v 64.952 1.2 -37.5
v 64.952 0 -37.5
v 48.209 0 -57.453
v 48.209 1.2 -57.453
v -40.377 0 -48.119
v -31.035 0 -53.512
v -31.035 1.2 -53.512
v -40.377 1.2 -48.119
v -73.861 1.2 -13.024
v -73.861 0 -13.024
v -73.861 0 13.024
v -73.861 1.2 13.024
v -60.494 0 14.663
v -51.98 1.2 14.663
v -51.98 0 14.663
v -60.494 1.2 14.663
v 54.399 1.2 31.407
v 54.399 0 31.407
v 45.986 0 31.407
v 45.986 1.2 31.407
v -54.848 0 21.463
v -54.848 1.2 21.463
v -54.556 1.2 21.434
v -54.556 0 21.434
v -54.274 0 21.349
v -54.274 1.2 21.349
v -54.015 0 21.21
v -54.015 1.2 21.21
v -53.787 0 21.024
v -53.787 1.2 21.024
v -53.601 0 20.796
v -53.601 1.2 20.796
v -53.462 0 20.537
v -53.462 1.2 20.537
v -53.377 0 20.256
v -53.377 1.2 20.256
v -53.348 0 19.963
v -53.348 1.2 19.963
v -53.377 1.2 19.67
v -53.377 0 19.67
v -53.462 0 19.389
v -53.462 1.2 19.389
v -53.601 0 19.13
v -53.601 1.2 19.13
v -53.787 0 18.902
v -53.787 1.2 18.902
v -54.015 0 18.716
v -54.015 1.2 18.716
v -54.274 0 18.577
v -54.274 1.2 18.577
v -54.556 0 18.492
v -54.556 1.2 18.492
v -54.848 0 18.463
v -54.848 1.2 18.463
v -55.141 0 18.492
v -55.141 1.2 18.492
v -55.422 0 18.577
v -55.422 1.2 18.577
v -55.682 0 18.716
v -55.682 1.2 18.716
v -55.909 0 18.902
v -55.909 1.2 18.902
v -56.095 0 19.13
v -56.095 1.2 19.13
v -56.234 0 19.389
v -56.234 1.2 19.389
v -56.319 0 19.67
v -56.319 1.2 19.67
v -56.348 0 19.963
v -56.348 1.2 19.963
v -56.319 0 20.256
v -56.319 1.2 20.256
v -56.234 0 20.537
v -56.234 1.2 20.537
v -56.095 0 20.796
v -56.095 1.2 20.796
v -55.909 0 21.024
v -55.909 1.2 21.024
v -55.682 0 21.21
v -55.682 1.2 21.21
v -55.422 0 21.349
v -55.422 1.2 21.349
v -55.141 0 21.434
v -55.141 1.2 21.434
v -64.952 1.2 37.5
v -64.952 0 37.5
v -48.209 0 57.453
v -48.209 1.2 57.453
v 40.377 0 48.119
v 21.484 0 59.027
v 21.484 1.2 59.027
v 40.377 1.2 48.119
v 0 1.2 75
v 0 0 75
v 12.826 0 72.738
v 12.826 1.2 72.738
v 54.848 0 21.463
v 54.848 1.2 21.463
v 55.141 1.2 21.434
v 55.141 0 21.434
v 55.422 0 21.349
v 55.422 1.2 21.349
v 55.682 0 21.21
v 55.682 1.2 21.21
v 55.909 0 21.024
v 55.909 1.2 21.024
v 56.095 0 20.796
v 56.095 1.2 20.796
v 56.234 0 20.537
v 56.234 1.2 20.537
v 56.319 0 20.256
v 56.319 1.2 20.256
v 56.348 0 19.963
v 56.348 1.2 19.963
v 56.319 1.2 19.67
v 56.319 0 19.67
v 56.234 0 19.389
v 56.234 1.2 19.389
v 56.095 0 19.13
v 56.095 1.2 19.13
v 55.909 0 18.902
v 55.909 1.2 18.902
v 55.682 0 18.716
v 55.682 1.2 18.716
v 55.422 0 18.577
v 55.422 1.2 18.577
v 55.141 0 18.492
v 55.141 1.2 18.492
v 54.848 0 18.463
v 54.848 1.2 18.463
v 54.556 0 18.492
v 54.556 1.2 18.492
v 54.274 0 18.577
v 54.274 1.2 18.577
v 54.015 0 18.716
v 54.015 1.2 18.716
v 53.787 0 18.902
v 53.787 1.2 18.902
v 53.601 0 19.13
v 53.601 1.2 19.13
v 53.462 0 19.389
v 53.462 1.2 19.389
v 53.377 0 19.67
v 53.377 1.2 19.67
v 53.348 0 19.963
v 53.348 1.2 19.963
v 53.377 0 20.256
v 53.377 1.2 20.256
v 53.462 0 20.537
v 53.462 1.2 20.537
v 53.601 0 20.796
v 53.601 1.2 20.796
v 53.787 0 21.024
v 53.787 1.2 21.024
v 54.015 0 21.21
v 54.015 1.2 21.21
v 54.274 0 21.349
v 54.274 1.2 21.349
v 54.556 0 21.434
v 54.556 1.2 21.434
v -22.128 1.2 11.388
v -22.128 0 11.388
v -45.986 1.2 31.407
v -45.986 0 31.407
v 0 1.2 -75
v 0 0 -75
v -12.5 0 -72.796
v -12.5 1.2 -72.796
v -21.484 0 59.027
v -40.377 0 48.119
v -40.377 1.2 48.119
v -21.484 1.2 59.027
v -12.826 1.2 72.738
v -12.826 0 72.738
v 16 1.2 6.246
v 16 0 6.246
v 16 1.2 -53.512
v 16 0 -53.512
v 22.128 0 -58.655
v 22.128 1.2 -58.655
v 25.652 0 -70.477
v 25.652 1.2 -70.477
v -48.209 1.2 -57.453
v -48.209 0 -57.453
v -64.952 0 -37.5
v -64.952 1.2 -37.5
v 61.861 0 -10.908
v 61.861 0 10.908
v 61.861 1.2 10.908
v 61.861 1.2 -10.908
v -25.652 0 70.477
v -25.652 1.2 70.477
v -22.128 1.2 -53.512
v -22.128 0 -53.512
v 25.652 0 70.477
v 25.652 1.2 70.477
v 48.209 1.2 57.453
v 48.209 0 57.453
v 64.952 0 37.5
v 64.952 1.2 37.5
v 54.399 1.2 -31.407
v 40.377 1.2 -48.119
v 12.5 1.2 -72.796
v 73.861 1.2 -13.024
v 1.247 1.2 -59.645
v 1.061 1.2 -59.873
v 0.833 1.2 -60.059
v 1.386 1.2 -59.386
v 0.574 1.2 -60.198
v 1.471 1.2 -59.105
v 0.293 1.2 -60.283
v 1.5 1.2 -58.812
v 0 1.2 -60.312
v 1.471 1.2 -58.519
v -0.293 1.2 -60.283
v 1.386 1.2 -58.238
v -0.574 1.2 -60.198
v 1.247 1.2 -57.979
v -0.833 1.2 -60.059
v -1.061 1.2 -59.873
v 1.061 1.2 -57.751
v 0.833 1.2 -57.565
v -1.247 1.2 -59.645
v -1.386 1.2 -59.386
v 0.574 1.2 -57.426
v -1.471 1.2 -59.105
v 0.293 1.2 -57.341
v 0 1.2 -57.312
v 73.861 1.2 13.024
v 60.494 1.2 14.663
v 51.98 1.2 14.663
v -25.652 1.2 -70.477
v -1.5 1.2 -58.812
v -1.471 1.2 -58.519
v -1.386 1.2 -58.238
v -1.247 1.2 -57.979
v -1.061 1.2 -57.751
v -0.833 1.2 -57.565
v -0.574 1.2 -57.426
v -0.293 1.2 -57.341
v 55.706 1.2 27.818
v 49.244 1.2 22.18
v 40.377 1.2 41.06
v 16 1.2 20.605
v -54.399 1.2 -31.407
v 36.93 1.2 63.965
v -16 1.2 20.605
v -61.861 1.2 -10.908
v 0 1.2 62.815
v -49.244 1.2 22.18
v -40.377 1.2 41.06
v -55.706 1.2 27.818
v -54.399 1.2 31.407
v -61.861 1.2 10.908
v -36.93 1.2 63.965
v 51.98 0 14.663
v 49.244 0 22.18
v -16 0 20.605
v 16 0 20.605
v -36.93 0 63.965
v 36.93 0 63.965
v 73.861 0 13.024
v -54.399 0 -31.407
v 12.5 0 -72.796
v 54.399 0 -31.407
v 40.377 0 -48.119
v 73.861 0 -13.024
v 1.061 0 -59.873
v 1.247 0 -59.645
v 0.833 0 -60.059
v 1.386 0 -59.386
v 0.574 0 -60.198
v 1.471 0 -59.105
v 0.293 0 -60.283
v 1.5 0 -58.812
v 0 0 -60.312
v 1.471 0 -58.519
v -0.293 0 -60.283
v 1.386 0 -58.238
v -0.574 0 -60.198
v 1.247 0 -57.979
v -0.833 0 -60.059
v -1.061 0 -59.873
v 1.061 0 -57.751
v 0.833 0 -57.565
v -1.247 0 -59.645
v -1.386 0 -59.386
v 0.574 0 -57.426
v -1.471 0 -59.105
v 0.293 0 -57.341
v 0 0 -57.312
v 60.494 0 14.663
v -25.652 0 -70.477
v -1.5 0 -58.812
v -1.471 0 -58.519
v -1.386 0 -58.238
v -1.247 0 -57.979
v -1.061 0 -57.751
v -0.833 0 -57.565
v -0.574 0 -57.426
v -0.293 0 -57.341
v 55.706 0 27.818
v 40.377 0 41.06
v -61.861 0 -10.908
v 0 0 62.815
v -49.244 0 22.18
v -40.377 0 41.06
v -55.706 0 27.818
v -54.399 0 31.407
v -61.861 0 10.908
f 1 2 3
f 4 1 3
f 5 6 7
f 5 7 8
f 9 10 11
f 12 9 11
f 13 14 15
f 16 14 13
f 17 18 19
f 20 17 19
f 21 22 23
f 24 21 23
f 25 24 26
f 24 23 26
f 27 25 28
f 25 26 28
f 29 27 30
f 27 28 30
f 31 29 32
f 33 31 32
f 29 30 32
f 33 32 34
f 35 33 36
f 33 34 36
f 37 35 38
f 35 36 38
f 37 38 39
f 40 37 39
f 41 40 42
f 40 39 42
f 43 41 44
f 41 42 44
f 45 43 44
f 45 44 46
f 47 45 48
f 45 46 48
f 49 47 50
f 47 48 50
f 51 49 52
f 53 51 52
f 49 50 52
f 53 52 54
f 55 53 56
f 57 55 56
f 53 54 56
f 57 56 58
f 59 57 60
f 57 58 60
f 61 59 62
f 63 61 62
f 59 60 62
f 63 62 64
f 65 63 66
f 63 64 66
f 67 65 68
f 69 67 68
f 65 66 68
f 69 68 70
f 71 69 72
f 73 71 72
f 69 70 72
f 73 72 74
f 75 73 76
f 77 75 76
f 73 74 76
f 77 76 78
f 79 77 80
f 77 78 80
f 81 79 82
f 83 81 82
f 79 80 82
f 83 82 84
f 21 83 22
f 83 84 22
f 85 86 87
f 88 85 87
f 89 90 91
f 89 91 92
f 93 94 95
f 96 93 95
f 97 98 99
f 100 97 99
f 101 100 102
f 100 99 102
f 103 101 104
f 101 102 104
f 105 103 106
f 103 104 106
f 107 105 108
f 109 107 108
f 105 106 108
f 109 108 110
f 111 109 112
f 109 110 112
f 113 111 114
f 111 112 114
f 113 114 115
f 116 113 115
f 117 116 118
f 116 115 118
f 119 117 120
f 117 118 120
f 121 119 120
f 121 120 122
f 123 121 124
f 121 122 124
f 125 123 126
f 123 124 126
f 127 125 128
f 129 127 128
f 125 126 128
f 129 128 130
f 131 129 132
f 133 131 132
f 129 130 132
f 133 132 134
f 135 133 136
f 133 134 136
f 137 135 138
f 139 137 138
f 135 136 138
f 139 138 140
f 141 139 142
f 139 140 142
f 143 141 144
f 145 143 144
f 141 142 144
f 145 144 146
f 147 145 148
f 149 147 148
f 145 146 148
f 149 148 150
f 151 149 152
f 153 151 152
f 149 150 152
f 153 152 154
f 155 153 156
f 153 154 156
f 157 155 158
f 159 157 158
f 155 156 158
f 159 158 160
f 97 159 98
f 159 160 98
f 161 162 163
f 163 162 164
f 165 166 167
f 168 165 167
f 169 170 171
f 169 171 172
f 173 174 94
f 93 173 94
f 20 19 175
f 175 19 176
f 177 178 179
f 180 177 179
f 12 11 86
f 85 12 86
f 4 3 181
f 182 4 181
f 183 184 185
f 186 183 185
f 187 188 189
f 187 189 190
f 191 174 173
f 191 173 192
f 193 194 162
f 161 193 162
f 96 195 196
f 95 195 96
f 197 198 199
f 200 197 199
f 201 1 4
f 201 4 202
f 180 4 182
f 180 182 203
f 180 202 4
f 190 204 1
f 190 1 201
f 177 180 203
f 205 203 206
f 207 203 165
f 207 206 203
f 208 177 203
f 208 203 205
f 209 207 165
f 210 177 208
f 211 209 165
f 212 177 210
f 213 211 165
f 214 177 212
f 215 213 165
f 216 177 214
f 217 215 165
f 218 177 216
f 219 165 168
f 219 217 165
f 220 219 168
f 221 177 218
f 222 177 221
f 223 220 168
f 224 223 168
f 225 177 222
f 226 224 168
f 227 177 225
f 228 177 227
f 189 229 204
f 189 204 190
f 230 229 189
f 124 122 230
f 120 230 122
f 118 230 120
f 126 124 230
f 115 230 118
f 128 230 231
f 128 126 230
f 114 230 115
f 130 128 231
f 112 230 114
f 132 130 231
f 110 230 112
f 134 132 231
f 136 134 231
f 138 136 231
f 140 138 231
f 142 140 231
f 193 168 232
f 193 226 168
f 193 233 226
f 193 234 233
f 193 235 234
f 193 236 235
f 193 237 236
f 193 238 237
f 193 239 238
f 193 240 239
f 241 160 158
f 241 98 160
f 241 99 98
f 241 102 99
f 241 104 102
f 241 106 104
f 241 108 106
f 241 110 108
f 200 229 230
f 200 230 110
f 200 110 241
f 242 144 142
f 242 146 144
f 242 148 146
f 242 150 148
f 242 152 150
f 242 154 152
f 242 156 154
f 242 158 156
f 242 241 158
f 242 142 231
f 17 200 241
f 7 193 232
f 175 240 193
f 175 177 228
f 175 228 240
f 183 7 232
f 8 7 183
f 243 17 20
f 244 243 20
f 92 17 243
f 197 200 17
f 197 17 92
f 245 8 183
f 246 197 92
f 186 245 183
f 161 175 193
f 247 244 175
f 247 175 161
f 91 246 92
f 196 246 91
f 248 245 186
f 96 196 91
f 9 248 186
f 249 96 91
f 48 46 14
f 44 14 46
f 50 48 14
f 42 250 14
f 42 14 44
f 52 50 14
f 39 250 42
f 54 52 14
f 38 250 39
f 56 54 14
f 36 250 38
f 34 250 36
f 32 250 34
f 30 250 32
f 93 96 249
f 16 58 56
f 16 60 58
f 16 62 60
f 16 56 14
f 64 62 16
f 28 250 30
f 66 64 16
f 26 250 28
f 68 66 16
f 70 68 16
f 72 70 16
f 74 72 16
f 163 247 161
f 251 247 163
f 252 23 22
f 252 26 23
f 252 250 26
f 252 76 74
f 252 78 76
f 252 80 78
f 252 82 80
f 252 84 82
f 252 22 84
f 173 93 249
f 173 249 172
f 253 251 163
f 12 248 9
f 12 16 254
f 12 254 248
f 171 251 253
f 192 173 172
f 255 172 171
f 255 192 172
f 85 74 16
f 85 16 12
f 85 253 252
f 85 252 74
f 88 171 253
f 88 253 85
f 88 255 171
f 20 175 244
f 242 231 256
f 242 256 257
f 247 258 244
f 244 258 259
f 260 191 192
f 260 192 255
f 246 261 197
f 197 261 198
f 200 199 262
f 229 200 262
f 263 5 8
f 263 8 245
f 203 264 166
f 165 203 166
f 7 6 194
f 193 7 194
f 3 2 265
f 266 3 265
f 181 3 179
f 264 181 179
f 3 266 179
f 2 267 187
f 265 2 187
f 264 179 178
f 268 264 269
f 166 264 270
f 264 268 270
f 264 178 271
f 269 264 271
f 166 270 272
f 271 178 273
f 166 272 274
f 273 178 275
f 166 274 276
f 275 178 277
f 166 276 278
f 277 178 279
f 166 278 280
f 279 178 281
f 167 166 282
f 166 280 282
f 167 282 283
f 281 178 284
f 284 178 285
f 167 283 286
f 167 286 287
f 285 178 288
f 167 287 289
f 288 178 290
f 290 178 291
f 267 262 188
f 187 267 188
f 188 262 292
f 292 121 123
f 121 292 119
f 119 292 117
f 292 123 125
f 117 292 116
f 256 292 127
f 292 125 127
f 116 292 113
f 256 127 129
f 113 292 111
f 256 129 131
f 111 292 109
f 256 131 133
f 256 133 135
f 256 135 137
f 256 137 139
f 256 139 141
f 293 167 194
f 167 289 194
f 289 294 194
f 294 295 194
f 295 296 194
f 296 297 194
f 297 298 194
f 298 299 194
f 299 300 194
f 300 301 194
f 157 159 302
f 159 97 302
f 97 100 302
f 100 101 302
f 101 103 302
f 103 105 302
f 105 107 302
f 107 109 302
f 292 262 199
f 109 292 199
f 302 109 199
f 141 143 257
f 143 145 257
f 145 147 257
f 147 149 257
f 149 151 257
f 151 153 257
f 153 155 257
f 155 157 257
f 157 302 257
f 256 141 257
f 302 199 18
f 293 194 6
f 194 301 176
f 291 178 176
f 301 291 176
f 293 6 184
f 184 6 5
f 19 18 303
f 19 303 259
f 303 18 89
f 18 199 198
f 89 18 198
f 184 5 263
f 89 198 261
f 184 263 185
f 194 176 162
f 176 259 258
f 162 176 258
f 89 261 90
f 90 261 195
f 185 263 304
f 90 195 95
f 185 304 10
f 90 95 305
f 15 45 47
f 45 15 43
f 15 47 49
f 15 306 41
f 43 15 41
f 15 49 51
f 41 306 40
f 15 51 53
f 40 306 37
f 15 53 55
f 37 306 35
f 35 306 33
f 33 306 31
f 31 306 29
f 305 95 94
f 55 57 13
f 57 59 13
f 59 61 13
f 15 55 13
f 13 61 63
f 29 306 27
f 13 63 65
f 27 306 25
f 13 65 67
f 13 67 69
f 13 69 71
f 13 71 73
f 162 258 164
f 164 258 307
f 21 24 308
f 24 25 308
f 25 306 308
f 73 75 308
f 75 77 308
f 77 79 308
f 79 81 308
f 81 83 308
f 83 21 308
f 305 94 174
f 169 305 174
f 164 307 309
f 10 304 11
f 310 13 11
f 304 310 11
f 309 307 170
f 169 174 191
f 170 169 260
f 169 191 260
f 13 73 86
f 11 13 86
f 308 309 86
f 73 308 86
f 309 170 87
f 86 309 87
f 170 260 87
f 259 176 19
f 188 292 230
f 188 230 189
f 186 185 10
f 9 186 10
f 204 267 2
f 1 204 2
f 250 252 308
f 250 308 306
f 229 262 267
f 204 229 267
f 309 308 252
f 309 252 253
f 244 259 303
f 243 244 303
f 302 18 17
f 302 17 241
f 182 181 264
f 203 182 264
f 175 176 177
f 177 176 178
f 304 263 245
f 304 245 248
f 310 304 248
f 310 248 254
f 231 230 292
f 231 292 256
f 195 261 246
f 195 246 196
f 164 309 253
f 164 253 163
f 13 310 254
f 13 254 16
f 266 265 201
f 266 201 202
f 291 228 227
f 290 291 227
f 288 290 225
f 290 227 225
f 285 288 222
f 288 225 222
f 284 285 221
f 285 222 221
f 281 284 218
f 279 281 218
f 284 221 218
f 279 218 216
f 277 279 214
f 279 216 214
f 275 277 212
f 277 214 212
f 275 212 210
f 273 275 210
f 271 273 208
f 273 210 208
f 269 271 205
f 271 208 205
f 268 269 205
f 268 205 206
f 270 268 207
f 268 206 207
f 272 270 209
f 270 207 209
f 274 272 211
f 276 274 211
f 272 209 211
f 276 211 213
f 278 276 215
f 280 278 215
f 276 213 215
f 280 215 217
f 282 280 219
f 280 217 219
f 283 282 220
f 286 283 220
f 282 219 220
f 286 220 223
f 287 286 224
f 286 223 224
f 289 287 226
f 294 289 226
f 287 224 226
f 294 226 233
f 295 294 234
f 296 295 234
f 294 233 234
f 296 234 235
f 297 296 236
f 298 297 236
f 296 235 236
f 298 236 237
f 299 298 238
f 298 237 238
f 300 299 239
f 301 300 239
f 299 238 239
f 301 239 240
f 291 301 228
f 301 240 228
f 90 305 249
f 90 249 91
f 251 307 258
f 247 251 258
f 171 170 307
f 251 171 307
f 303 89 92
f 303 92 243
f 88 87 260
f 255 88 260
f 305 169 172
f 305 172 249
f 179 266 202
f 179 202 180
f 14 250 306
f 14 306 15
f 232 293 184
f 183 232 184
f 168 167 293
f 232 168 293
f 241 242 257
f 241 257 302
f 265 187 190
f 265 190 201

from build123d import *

# Parameters (mm, degrees)
BOSS_EXTRUDE1_DEPTH    = 1.2
BOSS_EXTRUDE17_DEPTH   = 1.2
BOSS_EXTRUDE17_2_DEPTH = 1.2
BOSS_EXTRUDE17_3_DEPTH = 1.2
SKETCH18_W             = 18
SKETCH18_H             = 25
BOSS_EXTRUDE18_DEPTH   = 1.2
BOSS_EXTRUDE19_DEPTH   = 1.2
BOSS_EXTRUDE20_DEPTH   = 1.2
BOSS_EXTRUDE22_DEPTH   = 1.2
BOSS_EXTRUDE26_DEPTH   = 1.2
BOSS_EXTRUDE28_DEPTH   = 1.2
BOSS_EXTRUDE23_DEPTH   = 1.2
SKETCH38_R             = 1.5
CUT_EXTRUDE2_DEPTH     = 1.2
BOSS_EXTRUDE29_DEPTH   = 1.2
SKETCH37_R             = 1.5
CUT_EXTRUDE3_DEPTH     = 1.2
BOSS_EXTRUDE30_DEPTH   = 1.2
CUT_EXTRUDE4_DEPTH     = 1.2


with BuildPart() as part:
    # Sketch1 → Boss-Extrude1 (new body)
    with BuildSketch(Plane(origin=(0, 0, 0), x_dir=(1, 0, 0), z_dir=(0, 1, 0))):
        Polygon((0, 75), (-25.651510749, 70.476946559), (-48.209070726, 57.453333234), (-64.951905284, 37.5), (-73.860581476, 13.023613325), (-73.860581476, -13.023613325), (-64.951905284, -37.5), (-48.209070726, -57.453333234), (-25.651510749, -70.476946559), (0, -75), (25.651510749, -70.476946559), (48.209070726, -57.453333234), (64.951905284, -37.5), (73.860581476, -13.023613325), (73.860581476, 13.023613325), (64.951905284, 37.5), (48.209070726, 57.453333234), (25.651510749, 70.476946559), align=None)
        Polygon((0, 62.814880657), (-21.483954485, 59.026679829), (-40.37662699, 48.118990273), (-54.399282385, 31.407440329), (-61.860581476, 10.907689557), (-61.860581476, -10.907689557), (-54.399282385, -31.407440329), (-40.37662699, -48.118990273), (-21.483954485, -59.026679829), (0, -62.814880657), (21.483954485, -59.026679829), (40.37662699, -48.118990273), (54.399282385, -31.407440329), (61.860581476, -10.907689557), (61.860581476, 10.907689557), (54.399282385, 31.407440329), (40.37662699, 48.118990273), (21.483954485, 59.026679829), align=None, mode=Mode.SUBTRACT)
    extrude(amount=BOSS_EXTRUDE1_DEPTH)



with BuildPart() as body_2:
    # Sketch15 → Boss-Extrude17 (new body)
    with BuildSketch(Plane.XZ):
        Polygon((0, -101.401091909), (34.681215988, -95.285857807), (36.930290738, -93.987353894), (36.930290738, -84.749749587), (31.902845145, -87.652346653), (0, -93.277679014), (-31.902845145, -87.652346653), (-36.930290738, -84.749749587), (-36.930290738, -93.987353894), (-34.681215988, -95.285857807), align=None)
    extrude(amount=-BOSS_EXTRUDE17_DEPTH)


with BuildPart() as body_3:
    # Sketch15 → Boss-Extrude17 2 (new body)
    with BuildSketch(Plane.XZ):
        Polygon((92.620527368, -37.5), (99.860581476, -17.608114823), (99.860581476, 17.608114823), (92.620527368, 37.5), (84.107105188, 37.5), (91.860581476, 16.197498978), (91.860581476, -16.197498978), (84.107105188, -37.5), align=None)
    extrude(amount=-BOSS_EXTRUDE17_2_DEPTH)


with BuildPart() as body_4:
    # Sketch15 → Boss-Extrude17 3 (new body)
    with BuildSketch(Plane.XZ):
        Polygon((-92.620527368, 37.5), (-99.860581476, 17.608114823), (-99.860581476, -17.608114823), (-92.620527368, -37.5), (-84.107105188, -37.5), (-91.860581476, -16.197498978), (-91.860581476, 16.197498978), (-84.107105188, 37.5), align=None)
    extrude(amount=-BOSS_EXTRUDE17_3_DEPTH)


with BuildPart() as part_1:
    add(part.part)

    add(body_2.part)  # Boss-Extrude18 merges body 2

    add(body_3.part)  # Boss-Extrude18 merges body 3

    add(body_4.part)  # Boss-Extrude18 merges body 4
    # Sketch18 → Boss-Extrude18 (add)
    with BuildSketch(Plane.XZ):
        with Locations((-82.860581476, 0)):
            Rectangle(SKETCH18_W, SKETCH18_H)
        with Locations((82.860581476, 0)):
            Rectangle(SKETCH18_W, SKETCH18_H)
        Polygon((-12.5, -72.795912741), (-12.5, -91.073591755), (0, -93.277679014), (12.5, -91.073591755), (12.5, -72.795912741), (0, -75), align=None)
    extrude(amount=-BOSS_EXTRUDE18_DEPTH)

    # Sketch19 → Boss-Extrude19 (add)
    with BuildSketch(Plane.XZ):
        Polygon((-91.860581476, 16.197498978), (-82.860581476, 12.5), (-91.860581476, 12.5), align=None)
        Polygon((-91.860581476, -16.197498978), (-82.860581476, -12.5), (-91.860581476, -12.5), align=None)
        Polygon((91.860581476, 16.197498978), (82.860581476, 12.5), (91.860581476, 12.5), align=None)
        Polygon((91.860581476, -16.197498978), (82.860581476, -12.5), (91.860581476, -12.5), align=None)
        Polygon((22.201422573, -89.362969204), (12.5, -81.934752248), (12.5, -91.073591755), align=None)
        Polygon((-12.5, -81.934752248), (-12.5, -91.073591755), (-22.201422573, -89.362969204), align=None)
    extrude(amount=-BOSS_EXTRUDE19_DEPTH)

    # Sketch20 → Boss-Extrude20 (add)
    with BuildSketch(Plane.XZ):
        Polygon((-36.930290738, 63.965139896), (-36.930290738, 91.965139896), (-32.052421992, 91.965139896), (-12.825755375, 72.738473279), (-25.651510749, 70.476946559), align=None)
        Polygon((36.930290738, 63.965139896), (36.930290738, 91.965139896), (32.052421992, 91.965139896), (12.825755375, 72.738473279), (25.651510749, 70.476946559), align=None)
    extrude(amount=-BOSS_EXTRUDE20_DEPTH)

    # Sketch24 → Boss-Extrude22 (add)
    with BuildSketch(Plane(origin=(0, 1.2, 0), x_dir=(1, 0, 0), z_dir=(0, 1, 0))):
        Polygon((-36.930290738, 93.987353894), (-36.930290738, 80.130947434), (-30.513659724, 83.835591077), (-17.889679207, 86.061539446), (17.889679207, 86.061539446), (30.513659724, 83.835591077), (36.930290738, 80.130947434), (36.930290738, 93.987353894), (34.681215988, 95.285857807), (0, 101.401091909), (-34.681215988, 95.285857807), align=None)
    extrude(amount=-BOSS_EXTRUDE22_DEPTH)

    # Sketch27 → Boss-Extrude26 (add)
    with BuildSketch(Plane.XZ):
        Polygon((-50.923286541, 35.549970864), (-43.852622834, 43.976459738), (-16, 20.60533419), (16, 20.60533419), (43.852622834, 43.976459738), (50.923286541, 35.549970864), (16, 6.245854008), (16, -59.993648966), (0, -62.814880657), (-16, -59.993648966), (-16, 6.245854008), align=None)
    extrude(amount=-BOSS_EXTRUDE26_DEPTH)

    # Sketch43 → Boss-Extrude28 (add)
    with BuildSketch(Plane.XZ):
        Polygon((-40.37662699, 48.118990273), (-40.37662699, 41.059752907), (-43.852622834, 43.976459738), align=None)
        Polygon((40.37662699, 48.118990273), (40.37662699, 41.059752907), (43.852622834, 43.976459738), align=None)
        Polygon((54.399282385, 31.407440329), (45.986410894, 31.407440329), (50.923286541, 35.549970864), align=None)
        Polygon((-54.399282385, 31.407440329), (-45.986410894, 31.407440329), (-50.923286541, 35.549970864), align=None)
        Polygon((-22.128355545, -58.654634704), (-16, -53.512333827), (-16, -59.993648966), (-21.483954485, -59.026679829), align=None)
        Polygon((16, -59.993648966), (16, -53.512333827), (22.128355545, -58.654634704), (21.483954485, -59.026679829), align=None)
    extrude(amount=-BOSS_EXTRUDE28_DEPTH)

    # Sketch26 → Boss-Extrude23 (add)
    with BuildSketch(Plane(origin=(0, 1.2, 0), x_dir=(1, 0, 0), z_dir=(0, 1, 0))):
        Polygon((-36.930290738, 93.987353894), (-45.930290738, 88.791201472), (-45.930290738, 74.934795011), (-36.930290738, 80.130947434), align=None)
        Polygon((36.930290738, 93.987353894), (45.930290738, 88.791201472), (45.930290738, 74.934795011), (36.930290738, 80.130947434), align=None)
    extrude(amount=-BOSS_EXTRUDE23_DEPTH)

    # Sketch38 → Cut-Extrude2 (cut)
    with BuildSketch(Plane(origin=(0, 1.2, 0), x_dir=(1, 0, 0), z_dir=(0, 1, 0))):
        with Locations(Location((0, 58.81204127, 0), (0, 0, 270))):
            Circle(SKETCH38_R)
    extrude(amount=-CUT_EXTRUDE2_DEPTH, mode=Mode.SUBTRACT)

    # Sketch34 → Boss-Extrude29 (add)
    with BuildSketch(Plane(origin=(0, 1.2, 0), x_dir=(1, 0, 0), z_dir=(0, 1, 0))):
        Polygon((-60.493893717, -14.662633313), (-55.705611711, -27.818330004), (-49.244310391, -22.180174279), (-50.612390964, -18.421403796), (-51.980471537, -14.662633313), align=None)
        Polygon((50.612390964, -18.421403796), (49.244310391, -22.180174279), (55.705611711, -27.818330004), (60.493893717, -14.662633313), (51.980471537, -14.662633313), align=None)
    extrude(amount=-BOSS_EXTRUDE29_DEPTH)

    # Sketch37 → Cut-Extrude3 (cut)
    with BuildSketch(Plane(origin=(0, 1.2, 0), x_dir=(1, 0, 0), z_dir=(0, 1, 0))):
        with Locations(Location((-54.84814578, -19.96309247, 0), (0, 0, 270))):
            Circle(SKETCH37_R)
        with Locations(Location((54.84814578, -19.96309247, 0), (0, 0, 270))):
            Circle(SKETCH37_R)
    extrude(amount=-CUT_EXTRUDE3_DEPTH, mode=Mode.SUBTRACT)

    # Sketch44 → Boss-Extrude30 (add)
    with BuildSketch(Plane.XZ):
        Polygon((-22.128355545, 11.388154885), (-16, 6.245854008), (-16, -53.512333827), (-22.128355545, -58.654634704), (-31.035081933, -53.512333827), (-22.128355545, -53.512333827), align=None)
    extrude(amount=-BOSS_EXTRUDE30_DEPTH)

    # Sketch46 → Cut-Extrude4 (cut)
    with BuildSketch(Plane.XZ):
        Polygon((-73.860581476, -13.023613325), (-84.107105188, -37.5), (-92.620527368, -37.5), (-99.860581476, -17.608114823), (-99.860581476, 17.608114823), (-92.620527368, 37.5), (-84.107105188, 37.5), (-73.860581476, 12.5), align=None)
        Polygon((73.860581476, 12.5), (84.107105188, 37.5), (92.620527368, 37.5), (99.860581476, 17.608114823), (99.860581476, -17.608114823), (92.620527368, -37.5), (84.107105188, -37.5), (73.860581476, -12.5), align=None)
        Polygon((-12.5, -72.795912741), (-45.930290738, -74.934795011), (-45.930290738, -88.791201472), (-34.681215988, -95.285857807), (0, -101.401091909), (34.681215988, -95.285857807), (45.930290738, -88.791201472), (45.930290738, -74.934795011), (12.5, -72.795912741), (0, -75), align=None)
        Polygon((-36.930290738, 63.965139896), (-36.930290738, 91.965139896), (-32.052421992, 91.965139896), (-12.825755375, 72.738473279), (-25.651510749, 70.476946559), align=None)
        Polygon((12.825755375, 72.738473279), (32.052421992, 91.965139896), (36.930290738, 91.965139896), (36.930290738, 63.965139896), (25.651510749, 70.476946559), align=None)
    extrude(amount=-CUT_EXTRUDE4_DEPTH, mode=Mode.SUBTRACT)


solid = part_1.part
